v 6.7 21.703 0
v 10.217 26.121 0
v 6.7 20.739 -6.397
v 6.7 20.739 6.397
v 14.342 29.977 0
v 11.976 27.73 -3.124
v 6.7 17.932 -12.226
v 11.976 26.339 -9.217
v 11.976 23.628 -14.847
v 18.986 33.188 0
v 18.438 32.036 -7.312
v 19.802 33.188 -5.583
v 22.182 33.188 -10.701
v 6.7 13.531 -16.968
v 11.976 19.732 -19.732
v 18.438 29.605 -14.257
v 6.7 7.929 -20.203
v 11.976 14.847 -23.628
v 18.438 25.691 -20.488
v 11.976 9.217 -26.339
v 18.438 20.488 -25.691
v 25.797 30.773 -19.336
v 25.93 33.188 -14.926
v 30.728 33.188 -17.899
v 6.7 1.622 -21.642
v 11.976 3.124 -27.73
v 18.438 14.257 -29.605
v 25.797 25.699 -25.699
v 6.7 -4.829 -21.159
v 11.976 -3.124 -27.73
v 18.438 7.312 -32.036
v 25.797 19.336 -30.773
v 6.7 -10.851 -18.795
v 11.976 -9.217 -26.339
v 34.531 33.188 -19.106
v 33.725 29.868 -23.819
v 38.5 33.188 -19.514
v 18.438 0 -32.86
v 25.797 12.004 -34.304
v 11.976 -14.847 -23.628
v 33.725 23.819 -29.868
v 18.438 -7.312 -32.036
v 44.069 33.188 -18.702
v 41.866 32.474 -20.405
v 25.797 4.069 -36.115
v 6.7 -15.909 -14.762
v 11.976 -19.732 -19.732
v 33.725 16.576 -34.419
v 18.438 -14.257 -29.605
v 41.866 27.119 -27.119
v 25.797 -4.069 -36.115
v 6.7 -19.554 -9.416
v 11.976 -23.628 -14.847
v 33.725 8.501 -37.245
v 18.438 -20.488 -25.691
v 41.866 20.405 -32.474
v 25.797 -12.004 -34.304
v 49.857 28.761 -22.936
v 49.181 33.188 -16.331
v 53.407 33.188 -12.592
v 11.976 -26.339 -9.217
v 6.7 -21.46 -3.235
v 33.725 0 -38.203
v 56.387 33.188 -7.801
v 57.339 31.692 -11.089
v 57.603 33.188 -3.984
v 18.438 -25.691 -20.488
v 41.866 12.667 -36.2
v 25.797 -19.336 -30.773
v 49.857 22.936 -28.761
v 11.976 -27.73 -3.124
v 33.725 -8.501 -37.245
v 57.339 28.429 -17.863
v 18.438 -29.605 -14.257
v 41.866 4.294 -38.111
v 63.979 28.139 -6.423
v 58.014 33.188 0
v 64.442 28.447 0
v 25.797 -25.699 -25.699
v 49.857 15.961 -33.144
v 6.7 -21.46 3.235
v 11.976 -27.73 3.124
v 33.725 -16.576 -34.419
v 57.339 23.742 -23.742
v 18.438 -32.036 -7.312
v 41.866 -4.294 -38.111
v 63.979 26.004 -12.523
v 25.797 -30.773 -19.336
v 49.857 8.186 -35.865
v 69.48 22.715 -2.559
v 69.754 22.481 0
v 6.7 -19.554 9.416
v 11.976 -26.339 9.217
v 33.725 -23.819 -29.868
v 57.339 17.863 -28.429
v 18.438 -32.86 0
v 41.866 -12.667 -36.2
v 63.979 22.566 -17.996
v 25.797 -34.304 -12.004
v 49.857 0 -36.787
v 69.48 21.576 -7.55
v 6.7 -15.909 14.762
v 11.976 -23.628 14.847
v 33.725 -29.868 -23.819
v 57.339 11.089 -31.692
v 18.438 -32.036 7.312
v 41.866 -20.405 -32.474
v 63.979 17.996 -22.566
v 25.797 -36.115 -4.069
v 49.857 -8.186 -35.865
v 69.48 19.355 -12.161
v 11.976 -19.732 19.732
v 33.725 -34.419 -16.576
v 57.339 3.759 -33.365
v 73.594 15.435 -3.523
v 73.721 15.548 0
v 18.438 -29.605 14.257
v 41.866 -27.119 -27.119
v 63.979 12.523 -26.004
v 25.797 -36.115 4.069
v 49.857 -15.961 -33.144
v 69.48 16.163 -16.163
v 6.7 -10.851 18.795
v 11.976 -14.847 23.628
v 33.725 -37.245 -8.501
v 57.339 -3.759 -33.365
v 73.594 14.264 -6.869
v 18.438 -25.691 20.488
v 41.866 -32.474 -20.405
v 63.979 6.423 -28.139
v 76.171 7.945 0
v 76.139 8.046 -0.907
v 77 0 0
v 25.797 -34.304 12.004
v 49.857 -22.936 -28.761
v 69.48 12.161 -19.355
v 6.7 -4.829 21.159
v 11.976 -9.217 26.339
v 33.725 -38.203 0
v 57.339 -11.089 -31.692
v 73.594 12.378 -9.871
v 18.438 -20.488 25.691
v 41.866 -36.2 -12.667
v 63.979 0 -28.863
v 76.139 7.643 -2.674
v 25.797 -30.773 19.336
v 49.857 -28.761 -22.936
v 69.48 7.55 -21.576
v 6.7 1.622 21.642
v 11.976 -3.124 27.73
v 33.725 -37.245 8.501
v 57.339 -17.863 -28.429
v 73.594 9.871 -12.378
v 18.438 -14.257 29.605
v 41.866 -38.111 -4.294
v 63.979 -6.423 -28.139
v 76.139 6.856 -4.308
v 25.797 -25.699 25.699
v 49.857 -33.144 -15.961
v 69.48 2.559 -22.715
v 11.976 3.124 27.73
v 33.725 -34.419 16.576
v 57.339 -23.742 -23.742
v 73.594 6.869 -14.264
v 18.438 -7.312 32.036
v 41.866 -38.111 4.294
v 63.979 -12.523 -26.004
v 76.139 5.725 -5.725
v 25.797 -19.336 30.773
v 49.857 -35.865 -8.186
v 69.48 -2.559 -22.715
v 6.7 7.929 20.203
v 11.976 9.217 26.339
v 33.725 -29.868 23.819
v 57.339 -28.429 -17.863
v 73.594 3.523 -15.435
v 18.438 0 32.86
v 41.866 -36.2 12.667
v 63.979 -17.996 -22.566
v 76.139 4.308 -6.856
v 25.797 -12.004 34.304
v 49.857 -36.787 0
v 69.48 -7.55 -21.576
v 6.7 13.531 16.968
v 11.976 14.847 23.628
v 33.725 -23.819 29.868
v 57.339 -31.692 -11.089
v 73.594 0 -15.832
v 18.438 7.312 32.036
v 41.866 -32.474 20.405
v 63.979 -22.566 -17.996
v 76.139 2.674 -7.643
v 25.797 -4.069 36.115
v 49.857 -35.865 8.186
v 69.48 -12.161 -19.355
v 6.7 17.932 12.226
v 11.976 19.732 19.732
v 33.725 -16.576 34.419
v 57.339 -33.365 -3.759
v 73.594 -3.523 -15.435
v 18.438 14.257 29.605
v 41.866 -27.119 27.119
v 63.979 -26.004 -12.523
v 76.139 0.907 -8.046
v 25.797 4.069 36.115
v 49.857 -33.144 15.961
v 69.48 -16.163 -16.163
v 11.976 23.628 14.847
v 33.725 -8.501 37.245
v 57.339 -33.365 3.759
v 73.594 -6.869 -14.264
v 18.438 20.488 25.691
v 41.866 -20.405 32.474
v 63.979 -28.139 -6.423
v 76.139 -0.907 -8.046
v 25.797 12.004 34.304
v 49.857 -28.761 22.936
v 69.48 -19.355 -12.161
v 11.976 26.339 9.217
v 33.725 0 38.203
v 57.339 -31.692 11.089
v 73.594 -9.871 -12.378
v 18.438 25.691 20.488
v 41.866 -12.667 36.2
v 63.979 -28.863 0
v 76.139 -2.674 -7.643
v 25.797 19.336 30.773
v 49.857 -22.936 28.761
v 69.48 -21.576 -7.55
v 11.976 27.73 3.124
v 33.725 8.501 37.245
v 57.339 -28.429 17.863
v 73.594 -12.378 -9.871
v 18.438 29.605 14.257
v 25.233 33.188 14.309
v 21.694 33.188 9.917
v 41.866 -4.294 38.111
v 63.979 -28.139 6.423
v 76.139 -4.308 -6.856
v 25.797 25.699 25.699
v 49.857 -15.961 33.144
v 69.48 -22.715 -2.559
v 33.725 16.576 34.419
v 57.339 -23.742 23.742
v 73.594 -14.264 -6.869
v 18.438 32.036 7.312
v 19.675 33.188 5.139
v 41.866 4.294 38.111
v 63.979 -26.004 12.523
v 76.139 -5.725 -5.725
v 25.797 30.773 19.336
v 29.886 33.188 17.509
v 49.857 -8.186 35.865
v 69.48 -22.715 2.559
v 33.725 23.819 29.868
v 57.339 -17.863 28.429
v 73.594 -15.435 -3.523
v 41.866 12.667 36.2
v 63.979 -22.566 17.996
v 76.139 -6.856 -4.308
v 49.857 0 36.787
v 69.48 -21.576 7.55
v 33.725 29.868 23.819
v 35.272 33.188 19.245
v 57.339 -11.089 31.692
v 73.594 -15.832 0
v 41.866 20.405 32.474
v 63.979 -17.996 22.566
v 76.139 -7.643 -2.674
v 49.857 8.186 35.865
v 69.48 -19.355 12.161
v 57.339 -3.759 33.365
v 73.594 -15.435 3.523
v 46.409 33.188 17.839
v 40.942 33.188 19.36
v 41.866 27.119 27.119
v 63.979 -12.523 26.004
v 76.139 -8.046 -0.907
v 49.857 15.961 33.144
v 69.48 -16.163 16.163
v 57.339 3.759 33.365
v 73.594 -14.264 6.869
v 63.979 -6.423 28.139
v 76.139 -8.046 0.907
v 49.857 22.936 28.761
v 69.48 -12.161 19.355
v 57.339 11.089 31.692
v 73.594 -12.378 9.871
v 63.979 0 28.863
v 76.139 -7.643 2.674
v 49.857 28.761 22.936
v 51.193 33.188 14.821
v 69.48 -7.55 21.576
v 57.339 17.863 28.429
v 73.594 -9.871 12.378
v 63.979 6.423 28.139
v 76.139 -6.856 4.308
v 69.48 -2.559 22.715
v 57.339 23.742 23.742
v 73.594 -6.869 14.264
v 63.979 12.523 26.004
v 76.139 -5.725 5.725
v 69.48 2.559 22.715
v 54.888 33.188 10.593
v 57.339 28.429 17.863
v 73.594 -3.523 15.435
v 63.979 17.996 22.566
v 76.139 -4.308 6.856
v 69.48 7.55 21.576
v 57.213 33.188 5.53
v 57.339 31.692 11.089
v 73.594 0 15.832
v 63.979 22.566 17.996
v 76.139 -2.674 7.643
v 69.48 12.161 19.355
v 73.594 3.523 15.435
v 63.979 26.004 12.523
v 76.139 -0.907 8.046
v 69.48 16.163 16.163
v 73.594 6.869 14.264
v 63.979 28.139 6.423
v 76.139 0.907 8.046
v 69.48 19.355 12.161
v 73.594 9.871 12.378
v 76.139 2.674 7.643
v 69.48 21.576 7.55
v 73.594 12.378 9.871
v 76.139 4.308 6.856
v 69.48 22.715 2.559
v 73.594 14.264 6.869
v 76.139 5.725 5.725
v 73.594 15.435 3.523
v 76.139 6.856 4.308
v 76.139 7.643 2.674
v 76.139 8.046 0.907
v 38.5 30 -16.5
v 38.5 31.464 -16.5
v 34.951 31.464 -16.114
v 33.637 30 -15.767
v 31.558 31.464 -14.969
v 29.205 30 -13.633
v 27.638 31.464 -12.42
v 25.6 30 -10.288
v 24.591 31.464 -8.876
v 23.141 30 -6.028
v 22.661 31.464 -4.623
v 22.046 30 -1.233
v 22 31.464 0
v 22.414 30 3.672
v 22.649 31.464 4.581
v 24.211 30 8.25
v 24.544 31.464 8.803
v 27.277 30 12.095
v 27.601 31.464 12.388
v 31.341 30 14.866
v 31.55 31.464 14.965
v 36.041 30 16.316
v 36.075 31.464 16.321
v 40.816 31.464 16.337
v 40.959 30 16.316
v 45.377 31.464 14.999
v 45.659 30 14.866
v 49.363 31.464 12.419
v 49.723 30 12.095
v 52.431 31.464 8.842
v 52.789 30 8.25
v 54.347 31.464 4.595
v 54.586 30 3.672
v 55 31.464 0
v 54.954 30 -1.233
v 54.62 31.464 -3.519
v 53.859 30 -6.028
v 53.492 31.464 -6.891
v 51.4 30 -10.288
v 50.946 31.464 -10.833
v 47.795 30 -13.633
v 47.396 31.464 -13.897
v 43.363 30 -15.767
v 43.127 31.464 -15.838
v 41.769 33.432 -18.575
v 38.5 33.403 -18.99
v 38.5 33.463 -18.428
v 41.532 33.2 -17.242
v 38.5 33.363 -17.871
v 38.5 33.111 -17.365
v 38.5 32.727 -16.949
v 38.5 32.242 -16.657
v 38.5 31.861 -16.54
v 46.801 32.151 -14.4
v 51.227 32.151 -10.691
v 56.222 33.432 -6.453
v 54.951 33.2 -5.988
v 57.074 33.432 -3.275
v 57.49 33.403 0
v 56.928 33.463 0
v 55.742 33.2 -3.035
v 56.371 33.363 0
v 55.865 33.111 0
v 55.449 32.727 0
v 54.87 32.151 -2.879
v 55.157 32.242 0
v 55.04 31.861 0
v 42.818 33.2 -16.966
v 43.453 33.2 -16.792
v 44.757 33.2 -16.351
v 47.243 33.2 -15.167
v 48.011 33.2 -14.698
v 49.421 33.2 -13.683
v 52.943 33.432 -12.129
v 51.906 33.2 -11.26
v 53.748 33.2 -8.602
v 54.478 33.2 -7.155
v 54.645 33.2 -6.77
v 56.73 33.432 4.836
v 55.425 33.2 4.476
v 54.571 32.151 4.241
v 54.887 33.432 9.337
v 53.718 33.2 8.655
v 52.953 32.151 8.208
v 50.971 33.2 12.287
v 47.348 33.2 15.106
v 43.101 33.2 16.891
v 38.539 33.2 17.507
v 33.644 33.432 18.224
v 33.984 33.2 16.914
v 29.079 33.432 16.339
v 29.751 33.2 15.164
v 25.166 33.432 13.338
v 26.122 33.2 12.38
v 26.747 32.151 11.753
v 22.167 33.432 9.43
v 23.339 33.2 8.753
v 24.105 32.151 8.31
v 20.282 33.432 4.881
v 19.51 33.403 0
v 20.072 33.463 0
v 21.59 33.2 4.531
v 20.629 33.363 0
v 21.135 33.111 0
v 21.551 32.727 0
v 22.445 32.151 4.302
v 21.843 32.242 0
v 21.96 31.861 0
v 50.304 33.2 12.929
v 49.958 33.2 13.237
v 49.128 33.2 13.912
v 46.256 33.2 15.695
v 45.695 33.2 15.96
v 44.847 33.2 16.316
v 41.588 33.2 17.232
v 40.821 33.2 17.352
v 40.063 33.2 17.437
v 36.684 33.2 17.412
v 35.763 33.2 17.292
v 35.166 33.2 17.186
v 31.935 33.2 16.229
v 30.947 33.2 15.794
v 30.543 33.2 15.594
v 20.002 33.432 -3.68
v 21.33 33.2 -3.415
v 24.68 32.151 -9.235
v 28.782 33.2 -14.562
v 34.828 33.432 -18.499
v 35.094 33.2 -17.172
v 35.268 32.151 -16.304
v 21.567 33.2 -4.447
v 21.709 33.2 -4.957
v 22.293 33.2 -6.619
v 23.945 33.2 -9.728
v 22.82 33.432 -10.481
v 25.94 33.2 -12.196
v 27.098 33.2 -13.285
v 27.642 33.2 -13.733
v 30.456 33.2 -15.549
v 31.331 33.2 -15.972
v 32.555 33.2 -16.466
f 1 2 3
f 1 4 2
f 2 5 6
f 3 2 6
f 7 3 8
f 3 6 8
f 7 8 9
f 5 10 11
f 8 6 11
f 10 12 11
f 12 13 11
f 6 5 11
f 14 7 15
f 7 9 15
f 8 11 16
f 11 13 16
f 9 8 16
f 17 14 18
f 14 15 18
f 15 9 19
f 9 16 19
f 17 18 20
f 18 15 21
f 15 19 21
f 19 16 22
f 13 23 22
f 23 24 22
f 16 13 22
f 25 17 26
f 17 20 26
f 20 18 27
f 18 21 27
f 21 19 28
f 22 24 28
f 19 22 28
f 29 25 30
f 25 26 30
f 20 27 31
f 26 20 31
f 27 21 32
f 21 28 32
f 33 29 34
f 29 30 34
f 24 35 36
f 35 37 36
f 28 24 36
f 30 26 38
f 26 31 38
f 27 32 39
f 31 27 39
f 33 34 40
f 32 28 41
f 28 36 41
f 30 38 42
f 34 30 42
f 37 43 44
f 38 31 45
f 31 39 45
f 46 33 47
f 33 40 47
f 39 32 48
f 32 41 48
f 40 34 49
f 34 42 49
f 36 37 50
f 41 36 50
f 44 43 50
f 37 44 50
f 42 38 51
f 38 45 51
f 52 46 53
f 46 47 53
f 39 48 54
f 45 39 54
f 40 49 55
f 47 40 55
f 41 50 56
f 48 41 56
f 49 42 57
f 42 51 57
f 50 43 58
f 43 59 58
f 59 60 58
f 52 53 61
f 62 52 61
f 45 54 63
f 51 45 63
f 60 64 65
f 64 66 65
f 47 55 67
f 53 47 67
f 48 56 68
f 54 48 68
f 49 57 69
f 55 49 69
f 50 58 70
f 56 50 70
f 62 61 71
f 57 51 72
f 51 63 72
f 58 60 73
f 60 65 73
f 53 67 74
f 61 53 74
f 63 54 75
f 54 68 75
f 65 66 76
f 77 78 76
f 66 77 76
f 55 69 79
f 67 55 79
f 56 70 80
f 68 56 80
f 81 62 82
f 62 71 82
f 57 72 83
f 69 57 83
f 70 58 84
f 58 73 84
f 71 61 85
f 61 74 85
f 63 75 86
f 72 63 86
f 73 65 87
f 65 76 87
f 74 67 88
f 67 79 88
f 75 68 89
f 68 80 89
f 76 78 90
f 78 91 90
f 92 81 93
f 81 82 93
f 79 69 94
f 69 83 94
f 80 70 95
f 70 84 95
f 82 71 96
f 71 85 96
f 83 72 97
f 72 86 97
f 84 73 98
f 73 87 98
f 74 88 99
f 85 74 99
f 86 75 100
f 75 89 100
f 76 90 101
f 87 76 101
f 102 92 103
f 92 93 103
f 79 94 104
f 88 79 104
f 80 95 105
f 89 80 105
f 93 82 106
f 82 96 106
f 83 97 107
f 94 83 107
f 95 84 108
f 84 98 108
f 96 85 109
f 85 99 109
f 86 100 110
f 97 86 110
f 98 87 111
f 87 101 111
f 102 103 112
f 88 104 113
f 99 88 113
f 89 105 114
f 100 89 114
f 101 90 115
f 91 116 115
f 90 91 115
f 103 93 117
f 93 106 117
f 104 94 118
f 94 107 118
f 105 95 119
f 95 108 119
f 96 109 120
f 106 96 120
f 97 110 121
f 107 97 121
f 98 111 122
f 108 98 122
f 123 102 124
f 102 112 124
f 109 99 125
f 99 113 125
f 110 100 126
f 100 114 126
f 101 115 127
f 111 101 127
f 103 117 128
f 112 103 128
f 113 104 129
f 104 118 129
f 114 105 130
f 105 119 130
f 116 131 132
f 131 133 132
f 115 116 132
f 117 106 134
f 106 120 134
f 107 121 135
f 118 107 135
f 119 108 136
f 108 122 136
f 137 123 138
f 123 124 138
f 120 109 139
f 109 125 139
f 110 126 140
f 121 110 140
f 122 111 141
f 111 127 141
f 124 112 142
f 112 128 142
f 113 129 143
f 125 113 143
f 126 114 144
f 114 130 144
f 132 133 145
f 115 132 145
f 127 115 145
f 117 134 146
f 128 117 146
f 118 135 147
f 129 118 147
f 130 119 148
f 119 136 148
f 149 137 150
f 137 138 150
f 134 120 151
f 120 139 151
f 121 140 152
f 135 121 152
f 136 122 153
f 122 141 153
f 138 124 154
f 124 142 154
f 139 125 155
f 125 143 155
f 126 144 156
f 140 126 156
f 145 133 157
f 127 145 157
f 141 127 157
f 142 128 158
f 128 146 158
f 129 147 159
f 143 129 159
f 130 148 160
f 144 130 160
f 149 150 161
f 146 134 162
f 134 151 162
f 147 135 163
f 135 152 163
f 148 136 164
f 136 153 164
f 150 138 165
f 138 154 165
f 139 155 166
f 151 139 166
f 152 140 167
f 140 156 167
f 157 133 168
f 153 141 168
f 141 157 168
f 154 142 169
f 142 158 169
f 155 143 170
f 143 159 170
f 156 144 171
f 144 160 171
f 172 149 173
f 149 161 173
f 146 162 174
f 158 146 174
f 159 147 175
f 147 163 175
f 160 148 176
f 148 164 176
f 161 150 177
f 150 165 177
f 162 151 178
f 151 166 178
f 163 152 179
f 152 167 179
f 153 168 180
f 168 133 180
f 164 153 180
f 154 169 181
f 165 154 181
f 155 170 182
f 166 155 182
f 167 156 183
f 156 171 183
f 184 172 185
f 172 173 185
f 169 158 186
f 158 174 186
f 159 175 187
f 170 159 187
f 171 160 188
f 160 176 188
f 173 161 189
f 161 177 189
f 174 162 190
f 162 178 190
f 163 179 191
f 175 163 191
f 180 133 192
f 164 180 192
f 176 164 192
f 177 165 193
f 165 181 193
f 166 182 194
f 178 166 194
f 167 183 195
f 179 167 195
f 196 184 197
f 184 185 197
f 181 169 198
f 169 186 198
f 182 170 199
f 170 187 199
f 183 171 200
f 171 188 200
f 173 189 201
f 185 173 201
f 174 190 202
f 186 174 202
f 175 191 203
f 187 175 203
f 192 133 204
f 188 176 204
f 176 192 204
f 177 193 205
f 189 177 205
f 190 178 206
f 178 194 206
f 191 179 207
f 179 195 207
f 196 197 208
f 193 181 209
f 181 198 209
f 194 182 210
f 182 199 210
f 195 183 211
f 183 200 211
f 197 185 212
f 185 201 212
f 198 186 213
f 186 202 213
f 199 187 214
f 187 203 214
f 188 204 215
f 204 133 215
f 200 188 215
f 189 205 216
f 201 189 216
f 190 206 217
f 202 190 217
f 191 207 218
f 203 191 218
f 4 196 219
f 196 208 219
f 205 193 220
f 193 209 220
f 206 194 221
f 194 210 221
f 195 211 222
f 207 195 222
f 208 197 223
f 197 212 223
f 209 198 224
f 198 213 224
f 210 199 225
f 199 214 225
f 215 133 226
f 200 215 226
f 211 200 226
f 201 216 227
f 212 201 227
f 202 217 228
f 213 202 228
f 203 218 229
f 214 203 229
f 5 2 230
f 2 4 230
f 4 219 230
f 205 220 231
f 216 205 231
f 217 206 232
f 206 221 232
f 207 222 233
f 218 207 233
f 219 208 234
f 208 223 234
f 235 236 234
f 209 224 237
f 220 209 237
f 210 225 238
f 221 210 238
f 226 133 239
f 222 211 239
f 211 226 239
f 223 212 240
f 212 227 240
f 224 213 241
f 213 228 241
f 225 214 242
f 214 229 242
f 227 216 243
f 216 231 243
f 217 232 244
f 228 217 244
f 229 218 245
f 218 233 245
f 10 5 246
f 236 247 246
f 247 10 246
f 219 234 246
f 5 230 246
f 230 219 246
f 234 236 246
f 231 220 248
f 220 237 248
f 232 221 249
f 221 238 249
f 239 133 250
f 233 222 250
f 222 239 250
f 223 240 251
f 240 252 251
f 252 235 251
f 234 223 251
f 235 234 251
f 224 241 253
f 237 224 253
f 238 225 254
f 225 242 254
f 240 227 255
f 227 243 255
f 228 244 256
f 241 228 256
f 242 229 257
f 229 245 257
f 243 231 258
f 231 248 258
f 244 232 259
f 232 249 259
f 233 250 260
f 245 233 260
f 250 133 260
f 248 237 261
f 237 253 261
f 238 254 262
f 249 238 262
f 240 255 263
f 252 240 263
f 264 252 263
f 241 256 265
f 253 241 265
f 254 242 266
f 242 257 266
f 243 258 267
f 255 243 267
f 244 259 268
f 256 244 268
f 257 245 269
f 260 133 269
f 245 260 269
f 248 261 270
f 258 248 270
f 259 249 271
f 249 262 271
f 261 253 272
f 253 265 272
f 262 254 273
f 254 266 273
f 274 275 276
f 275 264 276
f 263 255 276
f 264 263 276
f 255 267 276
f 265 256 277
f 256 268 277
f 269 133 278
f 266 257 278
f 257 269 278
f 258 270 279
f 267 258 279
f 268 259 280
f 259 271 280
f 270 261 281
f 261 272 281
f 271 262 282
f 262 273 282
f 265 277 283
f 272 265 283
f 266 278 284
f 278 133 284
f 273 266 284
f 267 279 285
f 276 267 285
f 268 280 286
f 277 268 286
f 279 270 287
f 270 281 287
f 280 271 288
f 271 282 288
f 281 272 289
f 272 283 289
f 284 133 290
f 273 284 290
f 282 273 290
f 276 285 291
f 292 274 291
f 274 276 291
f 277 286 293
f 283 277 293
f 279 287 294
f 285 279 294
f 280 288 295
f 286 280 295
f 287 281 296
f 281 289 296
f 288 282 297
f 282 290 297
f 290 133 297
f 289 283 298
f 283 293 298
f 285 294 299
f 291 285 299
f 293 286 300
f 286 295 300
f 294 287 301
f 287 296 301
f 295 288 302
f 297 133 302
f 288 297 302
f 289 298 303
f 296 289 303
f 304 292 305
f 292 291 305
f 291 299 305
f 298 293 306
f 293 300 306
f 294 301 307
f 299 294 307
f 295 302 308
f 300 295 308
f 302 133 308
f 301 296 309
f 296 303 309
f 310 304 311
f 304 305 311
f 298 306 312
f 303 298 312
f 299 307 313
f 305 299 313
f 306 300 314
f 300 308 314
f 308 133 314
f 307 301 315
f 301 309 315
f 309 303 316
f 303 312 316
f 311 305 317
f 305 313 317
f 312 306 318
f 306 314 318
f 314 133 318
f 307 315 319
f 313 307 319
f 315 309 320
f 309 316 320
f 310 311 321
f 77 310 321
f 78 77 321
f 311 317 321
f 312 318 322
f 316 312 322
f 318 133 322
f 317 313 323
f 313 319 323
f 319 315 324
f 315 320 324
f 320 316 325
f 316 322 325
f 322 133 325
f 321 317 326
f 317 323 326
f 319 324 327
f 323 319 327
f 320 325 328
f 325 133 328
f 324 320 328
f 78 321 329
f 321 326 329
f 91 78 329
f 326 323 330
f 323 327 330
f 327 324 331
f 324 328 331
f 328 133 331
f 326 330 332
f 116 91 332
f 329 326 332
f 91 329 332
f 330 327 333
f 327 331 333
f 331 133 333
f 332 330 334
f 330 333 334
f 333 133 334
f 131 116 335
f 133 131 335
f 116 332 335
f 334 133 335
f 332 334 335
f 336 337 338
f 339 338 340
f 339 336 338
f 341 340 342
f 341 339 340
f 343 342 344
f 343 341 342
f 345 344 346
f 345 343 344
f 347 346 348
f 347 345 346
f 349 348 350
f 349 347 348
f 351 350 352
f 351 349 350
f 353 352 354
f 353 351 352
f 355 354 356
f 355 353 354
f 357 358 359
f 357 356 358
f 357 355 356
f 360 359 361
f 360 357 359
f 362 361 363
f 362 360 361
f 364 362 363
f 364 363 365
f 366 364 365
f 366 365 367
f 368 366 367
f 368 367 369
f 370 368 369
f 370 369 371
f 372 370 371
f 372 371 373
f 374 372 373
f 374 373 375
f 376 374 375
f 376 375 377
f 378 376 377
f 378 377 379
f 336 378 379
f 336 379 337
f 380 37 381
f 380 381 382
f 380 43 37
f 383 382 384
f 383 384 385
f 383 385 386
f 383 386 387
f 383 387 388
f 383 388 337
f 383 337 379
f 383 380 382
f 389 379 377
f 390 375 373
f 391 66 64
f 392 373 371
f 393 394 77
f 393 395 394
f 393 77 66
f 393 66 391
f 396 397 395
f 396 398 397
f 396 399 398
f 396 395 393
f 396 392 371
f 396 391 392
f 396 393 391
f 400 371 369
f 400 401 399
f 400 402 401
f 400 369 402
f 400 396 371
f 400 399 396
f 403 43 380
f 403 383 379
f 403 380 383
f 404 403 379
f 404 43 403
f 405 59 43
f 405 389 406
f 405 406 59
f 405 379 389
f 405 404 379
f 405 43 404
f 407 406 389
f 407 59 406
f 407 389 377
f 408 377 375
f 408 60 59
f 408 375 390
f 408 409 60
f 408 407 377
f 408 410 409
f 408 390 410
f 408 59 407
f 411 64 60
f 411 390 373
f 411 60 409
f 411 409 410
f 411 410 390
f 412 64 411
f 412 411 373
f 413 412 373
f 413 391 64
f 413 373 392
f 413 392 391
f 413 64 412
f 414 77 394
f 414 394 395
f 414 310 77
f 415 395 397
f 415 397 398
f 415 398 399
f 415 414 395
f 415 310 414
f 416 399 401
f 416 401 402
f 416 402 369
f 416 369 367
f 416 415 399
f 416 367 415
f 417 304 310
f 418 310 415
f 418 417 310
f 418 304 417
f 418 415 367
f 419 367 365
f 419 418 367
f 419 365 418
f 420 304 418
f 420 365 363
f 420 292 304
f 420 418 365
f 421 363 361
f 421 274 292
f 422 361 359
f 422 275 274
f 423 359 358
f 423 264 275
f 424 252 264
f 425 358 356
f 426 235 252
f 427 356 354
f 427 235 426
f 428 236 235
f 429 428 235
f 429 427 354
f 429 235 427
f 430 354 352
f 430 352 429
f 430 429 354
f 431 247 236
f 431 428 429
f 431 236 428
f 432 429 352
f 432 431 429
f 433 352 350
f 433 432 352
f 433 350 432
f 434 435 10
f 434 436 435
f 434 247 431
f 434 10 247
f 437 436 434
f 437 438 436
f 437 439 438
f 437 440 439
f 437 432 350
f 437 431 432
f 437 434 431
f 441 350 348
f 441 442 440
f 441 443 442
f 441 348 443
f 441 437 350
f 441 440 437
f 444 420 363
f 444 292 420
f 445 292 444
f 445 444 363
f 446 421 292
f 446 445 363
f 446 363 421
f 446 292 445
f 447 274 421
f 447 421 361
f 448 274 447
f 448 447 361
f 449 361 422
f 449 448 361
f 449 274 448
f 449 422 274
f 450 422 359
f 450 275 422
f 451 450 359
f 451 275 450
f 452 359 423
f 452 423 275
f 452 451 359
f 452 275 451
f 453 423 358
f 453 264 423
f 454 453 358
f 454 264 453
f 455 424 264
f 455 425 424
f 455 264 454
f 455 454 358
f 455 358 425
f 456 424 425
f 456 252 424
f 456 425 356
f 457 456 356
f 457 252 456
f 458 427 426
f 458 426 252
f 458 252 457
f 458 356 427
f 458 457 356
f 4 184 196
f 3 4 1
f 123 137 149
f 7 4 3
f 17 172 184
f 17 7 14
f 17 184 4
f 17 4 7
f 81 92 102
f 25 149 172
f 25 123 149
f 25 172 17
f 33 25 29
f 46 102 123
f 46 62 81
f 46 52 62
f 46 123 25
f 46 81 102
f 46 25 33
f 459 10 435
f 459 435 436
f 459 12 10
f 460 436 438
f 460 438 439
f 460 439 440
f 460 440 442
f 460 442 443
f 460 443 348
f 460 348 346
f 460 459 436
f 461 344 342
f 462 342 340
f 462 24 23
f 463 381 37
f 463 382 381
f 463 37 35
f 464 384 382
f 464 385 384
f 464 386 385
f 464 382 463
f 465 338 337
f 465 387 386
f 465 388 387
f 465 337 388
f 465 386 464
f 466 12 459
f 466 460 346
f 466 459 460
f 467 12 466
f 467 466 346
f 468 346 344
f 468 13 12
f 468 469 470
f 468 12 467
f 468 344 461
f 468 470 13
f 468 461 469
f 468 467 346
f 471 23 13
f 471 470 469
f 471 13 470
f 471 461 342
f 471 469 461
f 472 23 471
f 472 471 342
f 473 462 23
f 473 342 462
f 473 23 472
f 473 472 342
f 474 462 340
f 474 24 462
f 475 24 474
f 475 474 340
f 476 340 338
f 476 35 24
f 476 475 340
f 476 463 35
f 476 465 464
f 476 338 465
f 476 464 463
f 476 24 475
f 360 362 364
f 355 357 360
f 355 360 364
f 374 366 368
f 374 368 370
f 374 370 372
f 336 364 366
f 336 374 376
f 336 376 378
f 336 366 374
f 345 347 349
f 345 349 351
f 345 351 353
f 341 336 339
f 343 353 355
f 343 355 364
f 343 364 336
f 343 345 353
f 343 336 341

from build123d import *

# Parameters (mm, degrees)
KES_EKSTR_ZYON1_DEPTH      = 95.305355097
KES_EKSTR_ZYON1_DEPTH_BACK = 95.305355097
IZIM3_W                    = 6.7
IZIM3_H                    = 83.072589547
KES_EKSTR_ZYON2_START      = 30
IZIM4_R                    = 16.5
KES_EKSTR_ZYON2_DEPTH      = 65.305355097
RADYUS1_R                  = 2


with BuildPart() as part:
    # Çizim2 → Döndür1 (revolve)
    with BuildSketch(Plane.XY):
        with BuildLine():
            Line((77, 0), (0, 0))
            ThreePointArc((0, 0), (38.5, 38.5), (77, 0))
        make_face()
    revolve(axis=Axis((77, 0, 0), (-1, 0, 0)))

    # Çizim3 → Kes-Ekstrüzyon1 (cut, two sides: drawn at the far end of the back side and taken through both)
    with BuildSketch(Plane(origin=(0, 0, 0), x_dir=(1, 0, 0), z_dir=(0, 1, 0)).offset(-KES_EKSTR_ZYON1_DEPTH_BACK)):
        with Locations((3.35, -0.927609561)):
            Rectangle(IZIM3_W, IZIM3_H)
    extrude(amount=KES_EKSTR_ZYON1_DEPTH + KES_EKSTR_ZYON1_DEPTH_BACK, mode=Mode.SUBTRACT)

    # Çizim4 → Kes-Ekstrüzyon2 (cut, through all)
    with BuildSketch(Plane(origin=(0, 0, 0), x_dir=(1, 0, 0), z_dir=(0, 1, 0)).offset(KES_EKSTR_ZYON2_START)):
        with Locations(Location((38.5, 0, 0), (0, 0, 90))):
            Circle(IZIM4_R)
    extrude(amount=KES_EKSTR_ZYON2_DEPTH, mode=Mode.SUBTRACT)

    # Radyus1
    radyus1_edges = [part.edges().sort_by_distance(p)[0] for p in [
        (26.832738111, 34.785054262, -11.667261889),
    ]]
    fillet(radyus1_edges, radius=RADYUS1_R)


solid = part.part
